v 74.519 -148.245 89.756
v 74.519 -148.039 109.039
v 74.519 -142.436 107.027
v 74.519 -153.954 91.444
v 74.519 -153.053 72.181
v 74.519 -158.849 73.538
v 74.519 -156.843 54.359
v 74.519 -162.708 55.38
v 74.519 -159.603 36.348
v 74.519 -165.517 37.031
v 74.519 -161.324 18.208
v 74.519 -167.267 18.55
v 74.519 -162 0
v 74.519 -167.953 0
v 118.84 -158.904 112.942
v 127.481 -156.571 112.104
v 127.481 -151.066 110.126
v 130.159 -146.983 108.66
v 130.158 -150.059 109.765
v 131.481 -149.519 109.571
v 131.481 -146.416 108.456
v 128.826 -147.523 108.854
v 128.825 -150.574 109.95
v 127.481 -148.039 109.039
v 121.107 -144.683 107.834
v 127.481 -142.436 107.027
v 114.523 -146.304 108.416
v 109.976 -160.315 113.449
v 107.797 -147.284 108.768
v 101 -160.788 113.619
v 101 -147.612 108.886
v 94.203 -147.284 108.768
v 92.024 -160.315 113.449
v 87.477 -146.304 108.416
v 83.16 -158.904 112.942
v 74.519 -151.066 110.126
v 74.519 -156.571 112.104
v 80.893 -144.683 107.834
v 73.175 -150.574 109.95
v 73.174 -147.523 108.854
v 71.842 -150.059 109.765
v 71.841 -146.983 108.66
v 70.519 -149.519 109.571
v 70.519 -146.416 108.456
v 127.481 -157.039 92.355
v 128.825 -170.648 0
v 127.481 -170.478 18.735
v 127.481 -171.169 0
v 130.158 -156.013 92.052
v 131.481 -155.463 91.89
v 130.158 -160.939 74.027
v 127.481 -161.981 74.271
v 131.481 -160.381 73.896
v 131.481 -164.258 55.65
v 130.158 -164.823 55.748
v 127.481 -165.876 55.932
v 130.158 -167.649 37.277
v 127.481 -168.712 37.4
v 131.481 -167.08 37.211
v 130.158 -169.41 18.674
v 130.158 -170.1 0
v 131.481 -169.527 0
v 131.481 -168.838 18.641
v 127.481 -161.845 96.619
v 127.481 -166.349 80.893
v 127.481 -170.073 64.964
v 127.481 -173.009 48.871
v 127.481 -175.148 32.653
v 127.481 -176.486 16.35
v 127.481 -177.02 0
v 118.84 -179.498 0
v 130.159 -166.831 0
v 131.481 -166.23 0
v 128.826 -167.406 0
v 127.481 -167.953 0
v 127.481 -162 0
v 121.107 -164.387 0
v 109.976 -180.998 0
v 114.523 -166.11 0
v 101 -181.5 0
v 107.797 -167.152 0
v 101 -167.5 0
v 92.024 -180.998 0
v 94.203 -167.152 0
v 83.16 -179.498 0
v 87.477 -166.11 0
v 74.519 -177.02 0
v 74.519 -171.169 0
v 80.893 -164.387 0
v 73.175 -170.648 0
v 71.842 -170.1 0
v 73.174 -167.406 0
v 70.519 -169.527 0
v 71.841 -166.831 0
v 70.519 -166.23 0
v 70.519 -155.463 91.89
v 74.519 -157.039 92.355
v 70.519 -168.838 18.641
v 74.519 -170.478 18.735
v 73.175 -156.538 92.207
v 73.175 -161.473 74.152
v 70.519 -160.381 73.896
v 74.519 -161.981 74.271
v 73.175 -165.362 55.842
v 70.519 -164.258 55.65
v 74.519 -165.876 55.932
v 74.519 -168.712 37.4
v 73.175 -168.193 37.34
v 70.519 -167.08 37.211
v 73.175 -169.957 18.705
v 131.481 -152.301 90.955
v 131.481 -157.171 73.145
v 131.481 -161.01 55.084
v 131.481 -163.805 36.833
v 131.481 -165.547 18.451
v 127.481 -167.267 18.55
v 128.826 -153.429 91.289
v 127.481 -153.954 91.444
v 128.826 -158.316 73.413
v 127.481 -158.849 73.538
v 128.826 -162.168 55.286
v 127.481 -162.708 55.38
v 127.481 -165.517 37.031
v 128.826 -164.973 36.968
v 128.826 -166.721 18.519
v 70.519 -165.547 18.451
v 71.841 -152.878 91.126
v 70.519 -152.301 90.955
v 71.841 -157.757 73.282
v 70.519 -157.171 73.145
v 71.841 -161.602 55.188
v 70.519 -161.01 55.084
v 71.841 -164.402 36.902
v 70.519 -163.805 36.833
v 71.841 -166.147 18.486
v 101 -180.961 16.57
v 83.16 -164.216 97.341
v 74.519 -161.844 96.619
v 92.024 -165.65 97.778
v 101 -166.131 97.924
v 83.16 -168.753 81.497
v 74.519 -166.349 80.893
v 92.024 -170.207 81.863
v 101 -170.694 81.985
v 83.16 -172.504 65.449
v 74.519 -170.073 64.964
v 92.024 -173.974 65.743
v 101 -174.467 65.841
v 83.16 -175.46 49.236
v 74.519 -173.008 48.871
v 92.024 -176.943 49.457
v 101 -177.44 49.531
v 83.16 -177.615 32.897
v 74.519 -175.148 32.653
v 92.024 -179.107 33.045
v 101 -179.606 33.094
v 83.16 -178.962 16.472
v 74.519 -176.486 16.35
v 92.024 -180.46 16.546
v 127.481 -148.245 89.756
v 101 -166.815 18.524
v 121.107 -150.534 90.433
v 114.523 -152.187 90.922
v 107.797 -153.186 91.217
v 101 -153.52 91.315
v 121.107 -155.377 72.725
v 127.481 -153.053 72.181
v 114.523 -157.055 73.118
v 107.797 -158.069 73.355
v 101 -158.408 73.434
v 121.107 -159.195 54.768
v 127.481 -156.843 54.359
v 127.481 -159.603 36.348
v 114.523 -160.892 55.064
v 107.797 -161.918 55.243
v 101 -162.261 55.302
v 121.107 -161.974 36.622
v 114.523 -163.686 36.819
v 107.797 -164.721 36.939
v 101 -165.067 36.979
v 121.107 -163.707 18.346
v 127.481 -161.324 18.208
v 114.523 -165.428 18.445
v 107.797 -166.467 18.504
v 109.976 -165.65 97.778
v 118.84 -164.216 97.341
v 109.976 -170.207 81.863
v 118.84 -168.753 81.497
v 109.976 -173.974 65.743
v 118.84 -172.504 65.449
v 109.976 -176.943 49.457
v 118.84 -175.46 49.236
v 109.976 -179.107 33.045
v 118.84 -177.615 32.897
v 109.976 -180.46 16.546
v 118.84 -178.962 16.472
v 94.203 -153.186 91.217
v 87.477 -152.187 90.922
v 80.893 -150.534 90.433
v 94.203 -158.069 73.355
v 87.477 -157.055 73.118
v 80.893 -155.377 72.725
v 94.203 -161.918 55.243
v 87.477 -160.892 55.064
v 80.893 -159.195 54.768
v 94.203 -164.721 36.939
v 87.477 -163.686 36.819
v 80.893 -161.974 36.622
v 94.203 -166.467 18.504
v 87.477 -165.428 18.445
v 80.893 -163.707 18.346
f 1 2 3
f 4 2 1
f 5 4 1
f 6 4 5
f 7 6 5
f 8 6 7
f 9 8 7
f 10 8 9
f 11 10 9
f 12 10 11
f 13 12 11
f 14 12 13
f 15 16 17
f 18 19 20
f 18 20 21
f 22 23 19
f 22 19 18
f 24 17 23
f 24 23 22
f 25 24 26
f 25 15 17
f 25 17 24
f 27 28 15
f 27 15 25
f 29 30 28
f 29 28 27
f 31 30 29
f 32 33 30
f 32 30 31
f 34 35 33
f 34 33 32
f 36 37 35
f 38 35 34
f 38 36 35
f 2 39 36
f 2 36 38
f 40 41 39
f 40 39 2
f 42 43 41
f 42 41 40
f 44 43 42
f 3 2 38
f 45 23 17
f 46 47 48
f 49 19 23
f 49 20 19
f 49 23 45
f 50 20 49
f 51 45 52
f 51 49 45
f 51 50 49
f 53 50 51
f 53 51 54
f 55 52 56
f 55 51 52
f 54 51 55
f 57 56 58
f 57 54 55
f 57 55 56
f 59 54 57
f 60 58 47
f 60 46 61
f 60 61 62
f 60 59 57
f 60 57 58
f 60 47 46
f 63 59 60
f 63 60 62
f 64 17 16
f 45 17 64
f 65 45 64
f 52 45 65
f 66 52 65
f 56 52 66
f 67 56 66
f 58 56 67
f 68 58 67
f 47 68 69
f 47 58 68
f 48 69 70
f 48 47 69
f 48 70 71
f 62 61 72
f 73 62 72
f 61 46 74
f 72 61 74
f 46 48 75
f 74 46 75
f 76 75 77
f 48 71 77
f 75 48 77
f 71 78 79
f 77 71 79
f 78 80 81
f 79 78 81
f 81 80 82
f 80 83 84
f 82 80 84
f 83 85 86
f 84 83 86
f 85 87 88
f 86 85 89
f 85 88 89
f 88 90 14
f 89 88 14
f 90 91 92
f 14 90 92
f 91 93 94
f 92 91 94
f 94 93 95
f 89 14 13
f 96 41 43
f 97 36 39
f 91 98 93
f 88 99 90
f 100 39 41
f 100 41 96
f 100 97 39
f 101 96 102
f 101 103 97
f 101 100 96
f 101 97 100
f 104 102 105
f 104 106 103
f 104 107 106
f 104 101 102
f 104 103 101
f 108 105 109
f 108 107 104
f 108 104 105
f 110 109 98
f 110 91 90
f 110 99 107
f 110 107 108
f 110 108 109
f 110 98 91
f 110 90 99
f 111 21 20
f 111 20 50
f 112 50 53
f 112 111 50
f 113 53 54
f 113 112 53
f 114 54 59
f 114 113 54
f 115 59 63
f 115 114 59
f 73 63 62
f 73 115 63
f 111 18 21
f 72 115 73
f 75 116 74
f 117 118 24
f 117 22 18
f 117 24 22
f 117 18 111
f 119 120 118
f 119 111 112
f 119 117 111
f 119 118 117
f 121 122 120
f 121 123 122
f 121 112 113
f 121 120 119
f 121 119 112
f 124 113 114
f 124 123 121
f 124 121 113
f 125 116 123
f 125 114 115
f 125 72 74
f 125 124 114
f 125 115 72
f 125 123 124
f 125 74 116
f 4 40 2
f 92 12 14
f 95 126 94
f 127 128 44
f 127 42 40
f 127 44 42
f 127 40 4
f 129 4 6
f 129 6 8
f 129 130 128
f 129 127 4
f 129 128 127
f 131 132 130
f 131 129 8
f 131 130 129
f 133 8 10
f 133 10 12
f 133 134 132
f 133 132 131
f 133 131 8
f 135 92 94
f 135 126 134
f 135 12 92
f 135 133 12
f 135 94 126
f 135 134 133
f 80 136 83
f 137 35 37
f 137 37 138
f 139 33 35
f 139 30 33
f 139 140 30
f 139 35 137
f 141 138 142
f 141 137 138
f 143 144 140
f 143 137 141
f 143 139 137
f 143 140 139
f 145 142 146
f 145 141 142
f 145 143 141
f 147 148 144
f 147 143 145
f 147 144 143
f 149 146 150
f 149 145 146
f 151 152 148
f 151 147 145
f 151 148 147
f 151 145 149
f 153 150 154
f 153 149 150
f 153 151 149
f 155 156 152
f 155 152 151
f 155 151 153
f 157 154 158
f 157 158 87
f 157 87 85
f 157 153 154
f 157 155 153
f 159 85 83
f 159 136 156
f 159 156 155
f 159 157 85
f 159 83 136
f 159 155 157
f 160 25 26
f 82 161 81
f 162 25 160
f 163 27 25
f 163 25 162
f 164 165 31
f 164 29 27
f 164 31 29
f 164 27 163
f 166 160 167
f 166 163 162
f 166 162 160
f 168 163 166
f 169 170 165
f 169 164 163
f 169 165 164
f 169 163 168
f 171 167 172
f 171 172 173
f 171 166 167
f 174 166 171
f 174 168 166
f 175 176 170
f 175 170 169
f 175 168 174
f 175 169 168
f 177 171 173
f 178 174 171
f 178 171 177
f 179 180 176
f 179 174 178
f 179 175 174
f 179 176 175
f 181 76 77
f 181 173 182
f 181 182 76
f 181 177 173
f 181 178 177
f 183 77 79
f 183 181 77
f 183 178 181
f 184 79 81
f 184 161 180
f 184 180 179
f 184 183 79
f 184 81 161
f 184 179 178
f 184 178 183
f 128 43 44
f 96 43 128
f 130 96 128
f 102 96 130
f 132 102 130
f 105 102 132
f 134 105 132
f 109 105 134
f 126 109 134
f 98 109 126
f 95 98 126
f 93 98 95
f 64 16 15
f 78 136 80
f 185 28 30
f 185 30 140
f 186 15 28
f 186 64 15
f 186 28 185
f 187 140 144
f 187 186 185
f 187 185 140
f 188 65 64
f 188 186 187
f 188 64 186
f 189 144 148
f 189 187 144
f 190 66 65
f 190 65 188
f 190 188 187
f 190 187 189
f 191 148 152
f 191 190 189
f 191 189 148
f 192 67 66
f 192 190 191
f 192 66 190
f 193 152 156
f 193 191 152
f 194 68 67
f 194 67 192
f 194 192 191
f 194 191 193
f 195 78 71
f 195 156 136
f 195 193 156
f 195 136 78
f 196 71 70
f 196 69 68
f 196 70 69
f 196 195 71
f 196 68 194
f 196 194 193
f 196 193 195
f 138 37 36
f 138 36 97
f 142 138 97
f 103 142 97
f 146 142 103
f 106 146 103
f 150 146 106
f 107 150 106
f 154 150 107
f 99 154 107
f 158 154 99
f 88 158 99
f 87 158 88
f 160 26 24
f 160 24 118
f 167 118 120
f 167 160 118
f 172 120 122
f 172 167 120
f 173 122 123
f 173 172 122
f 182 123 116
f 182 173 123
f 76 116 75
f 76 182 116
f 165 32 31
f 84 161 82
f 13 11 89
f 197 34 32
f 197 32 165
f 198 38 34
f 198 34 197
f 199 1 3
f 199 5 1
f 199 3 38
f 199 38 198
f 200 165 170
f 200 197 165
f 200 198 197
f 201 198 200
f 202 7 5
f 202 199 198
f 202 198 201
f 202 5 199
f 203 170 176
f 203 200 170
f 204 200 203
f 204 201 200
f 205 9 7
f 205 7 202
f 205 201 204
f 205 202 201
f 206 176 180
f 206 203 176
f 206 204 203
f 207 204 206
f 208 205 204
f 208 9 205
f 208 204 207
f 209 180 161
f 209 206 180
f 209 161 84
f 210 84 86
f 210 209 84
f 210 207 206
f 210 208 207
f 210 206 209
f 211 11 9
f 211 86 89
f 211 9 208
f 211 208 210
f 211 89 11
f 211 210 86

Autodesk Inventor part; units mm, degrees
ref_plane "XZ Plane" through (0, 0, 0) normal (0, 1, 0) x (-1, 0, 0)
sketch "Эскиз1" plane through (0, 0, 0) normal (0, 0, 1) x (1, 0, 0)
  arc A0 (74.5189, -162) -> (127.4811, -162) centre (101, -101) ccw
  arc A1 (48.4714, -162) -> (153.5286, -162) centre (101, -101) ccw
  line L0 (-97.5257, 0) -> (307.6841, 0) projected
  line L1 (-39.6386, -162) -> (244.9538, -162)
  line L2 (101, -167.5) -> (101, -181.5)
  arc A2 (142.003, -162) -> (59.997, -162) centre (101, -101) ccw
  circle A3 centre (101, -101) radius 72
  circle A4 centre (101, -101) radius 75
  line L3 (170.7391, -120.21) -> (170.39, -120.21)
  line L4 (170.39, -120.21) -> (173.4981, -120.21)
  line L5 (31.61, -120.21) -> (28.5019, -120.21)
  line L6 (74.5189, -162) -> (74.5189, -177.0197)
  line L7 (127.4811, -162) -> (127.4811, -177.0197)
  line L8 (70.5189, -166.2296) -> (70.5189, -169.5266)
  line L9 (131.4811, -166.2296) -> (131.4811, -169.5266)
  point P0 (0, 0)
  point P1 (167.5699, -124.21)
  point P2 (163.3181, -124.21)
  point P3 (38.6819, -124.21)
  point P4 (34.4301, -124.21)
  point P5 (101, -174.5)
  point P6 (57.3652, -162)
  point P7 (144.6348, -162)
  point P8 (62.7508, -162)
  point P9 (170.7391, -120.21)
  point P10 (74.5189, -167.9533)
  point P11 (74.5189, -171.1694)
  point P12 (127.4811, -171.1694)
  point P13 (127.4811, -167.9533)
  dimension "d0" = 133
  dimension "d1" = 161
  dimension "d3" = -101
  dimension "d4" = 61
  dimension "d30" = 1.5
  dimension "d31" = 1.5
  dimension "d33" = 73.5
  dimension "d34" = 4
ref_plane "РабПлоскость1" through (0, 0, 60) normal (0, 0, 1) x (1, 0, 0)
sketch "Эскиз2" plane through (0, 0, 60) normal (0, 0, 1) x (1, 0, 0)
  circle A0 centre (101, -101) radius 70.5
  line L0 (-96.1046, 0) -> (307.4472, 0) projected
  arc A1 (34.4301, -164.21) -> (167.5699, -164.21) centre (101, -141) ccw
  arc A2 (38.6819, -164.21) -> (163.3181, -164.21) centre (101, -141) ccw
  line L1 (-38.4543, -164.21) -> (249.797, -164.21)
  point P0 (0, 0)
  dimension "d9" = 141
  dimension "d10" = 141
  dimension "d11" = 133
  dimension "d12" = 23.21
sketch "Эскиз3" plane through (0, 0, 0) normal (1, 0, 0) x (0, 1, 0)
  arc A0 (-211.5, 60) -> (-171.5, 0) centre (-52.4181, 122.7213) ccw
  point P0 (0, 0)
  point P1 (-164.21, 60)
  point P2 (-162, 0)
  dimension "d13" = 171
sketch "Эскиз4" plane through (0, 0, 0) normal (1, 0, 0) x (0, 1, 0)
  line L0 (0, -518.9739) -> (0, 512.8159) projected
  arc A0 (-151.3766, 110.2381) -> (-171.5, 0) centre (155.0612, -2.6563) ccw
  arc A1 (-171.3994, 5.874) -> (-171.5, 0) centre (0, 0) ccw
  point P0 (-131.3766, -110.2381)
  dimension "d25" = 326.572
sweep "Сдвиг2" add profiles "Эскиз1" path "Эскиз4" path curves A0 contours A0 L2 A3 L6 | A0 L7 A3 L2 | L6 A4 L8 A3 | A3 L2 A4 L6 | A3 L7 A4 L2 | A3 L9 A4 L7 | A4 L2 A1 L6 | A4 L7 A1 L2
ref_plane "РабПлоскость2" through (101, 0, 0) normal (1, 0, 0) x (0, 1, 0)
sketch "Эскиз5" plane through (101, 0, 0) normal (1, 0, 0) x (0, 1, 0)
  line L0 (-177.0197, 0) -> (-177.0197, 0) projected
  line L1 (-156.5714, 112.104) -> (-156.5714, 112.104) projected
  line L2 (-177.0197, 0) -> (-177.0197, 0) projected
  line L3 (-156.5714, 112.104) -> (-156.5714, 112.104) projected
  arc A0 (-162, 0) -> (-142.4359, 107.0266) centre (155.0612, -2.6563) ccw projected
  line L4 (-162, 0) -> (-181.5, 0) projected
  circle A1 centre (155.0612, -2.6563) radius 336.5717
  arc A2 (-156.5714, 112.104) -> (-177.0197, 0) centre (155.0612, -2.6563) ccw projected
  arc A3 (-156.5714, 112.104) -> (-177.0197, 0) centre (155.0612, -2.6563) ccw projected
  arc A4 (-156.5714, 112.104) -> (-177.0197, 0) centre (155.0612, -2.6563) ccw projected
  arc A5 (-156.5714, 112.104) -> (-177.0197, 0) centre (155.0612, -2.6563) ccw projected
  point P0 (0, 0)
  point P1 (-162, 0)
  point P2 (-142.4359, 107.0266)
  point P3 (-162, 0)
  point P4 (-142.4359, 107.0266)
  dimension "d28" = 673.1434
properties part number "направление мяча 2"
